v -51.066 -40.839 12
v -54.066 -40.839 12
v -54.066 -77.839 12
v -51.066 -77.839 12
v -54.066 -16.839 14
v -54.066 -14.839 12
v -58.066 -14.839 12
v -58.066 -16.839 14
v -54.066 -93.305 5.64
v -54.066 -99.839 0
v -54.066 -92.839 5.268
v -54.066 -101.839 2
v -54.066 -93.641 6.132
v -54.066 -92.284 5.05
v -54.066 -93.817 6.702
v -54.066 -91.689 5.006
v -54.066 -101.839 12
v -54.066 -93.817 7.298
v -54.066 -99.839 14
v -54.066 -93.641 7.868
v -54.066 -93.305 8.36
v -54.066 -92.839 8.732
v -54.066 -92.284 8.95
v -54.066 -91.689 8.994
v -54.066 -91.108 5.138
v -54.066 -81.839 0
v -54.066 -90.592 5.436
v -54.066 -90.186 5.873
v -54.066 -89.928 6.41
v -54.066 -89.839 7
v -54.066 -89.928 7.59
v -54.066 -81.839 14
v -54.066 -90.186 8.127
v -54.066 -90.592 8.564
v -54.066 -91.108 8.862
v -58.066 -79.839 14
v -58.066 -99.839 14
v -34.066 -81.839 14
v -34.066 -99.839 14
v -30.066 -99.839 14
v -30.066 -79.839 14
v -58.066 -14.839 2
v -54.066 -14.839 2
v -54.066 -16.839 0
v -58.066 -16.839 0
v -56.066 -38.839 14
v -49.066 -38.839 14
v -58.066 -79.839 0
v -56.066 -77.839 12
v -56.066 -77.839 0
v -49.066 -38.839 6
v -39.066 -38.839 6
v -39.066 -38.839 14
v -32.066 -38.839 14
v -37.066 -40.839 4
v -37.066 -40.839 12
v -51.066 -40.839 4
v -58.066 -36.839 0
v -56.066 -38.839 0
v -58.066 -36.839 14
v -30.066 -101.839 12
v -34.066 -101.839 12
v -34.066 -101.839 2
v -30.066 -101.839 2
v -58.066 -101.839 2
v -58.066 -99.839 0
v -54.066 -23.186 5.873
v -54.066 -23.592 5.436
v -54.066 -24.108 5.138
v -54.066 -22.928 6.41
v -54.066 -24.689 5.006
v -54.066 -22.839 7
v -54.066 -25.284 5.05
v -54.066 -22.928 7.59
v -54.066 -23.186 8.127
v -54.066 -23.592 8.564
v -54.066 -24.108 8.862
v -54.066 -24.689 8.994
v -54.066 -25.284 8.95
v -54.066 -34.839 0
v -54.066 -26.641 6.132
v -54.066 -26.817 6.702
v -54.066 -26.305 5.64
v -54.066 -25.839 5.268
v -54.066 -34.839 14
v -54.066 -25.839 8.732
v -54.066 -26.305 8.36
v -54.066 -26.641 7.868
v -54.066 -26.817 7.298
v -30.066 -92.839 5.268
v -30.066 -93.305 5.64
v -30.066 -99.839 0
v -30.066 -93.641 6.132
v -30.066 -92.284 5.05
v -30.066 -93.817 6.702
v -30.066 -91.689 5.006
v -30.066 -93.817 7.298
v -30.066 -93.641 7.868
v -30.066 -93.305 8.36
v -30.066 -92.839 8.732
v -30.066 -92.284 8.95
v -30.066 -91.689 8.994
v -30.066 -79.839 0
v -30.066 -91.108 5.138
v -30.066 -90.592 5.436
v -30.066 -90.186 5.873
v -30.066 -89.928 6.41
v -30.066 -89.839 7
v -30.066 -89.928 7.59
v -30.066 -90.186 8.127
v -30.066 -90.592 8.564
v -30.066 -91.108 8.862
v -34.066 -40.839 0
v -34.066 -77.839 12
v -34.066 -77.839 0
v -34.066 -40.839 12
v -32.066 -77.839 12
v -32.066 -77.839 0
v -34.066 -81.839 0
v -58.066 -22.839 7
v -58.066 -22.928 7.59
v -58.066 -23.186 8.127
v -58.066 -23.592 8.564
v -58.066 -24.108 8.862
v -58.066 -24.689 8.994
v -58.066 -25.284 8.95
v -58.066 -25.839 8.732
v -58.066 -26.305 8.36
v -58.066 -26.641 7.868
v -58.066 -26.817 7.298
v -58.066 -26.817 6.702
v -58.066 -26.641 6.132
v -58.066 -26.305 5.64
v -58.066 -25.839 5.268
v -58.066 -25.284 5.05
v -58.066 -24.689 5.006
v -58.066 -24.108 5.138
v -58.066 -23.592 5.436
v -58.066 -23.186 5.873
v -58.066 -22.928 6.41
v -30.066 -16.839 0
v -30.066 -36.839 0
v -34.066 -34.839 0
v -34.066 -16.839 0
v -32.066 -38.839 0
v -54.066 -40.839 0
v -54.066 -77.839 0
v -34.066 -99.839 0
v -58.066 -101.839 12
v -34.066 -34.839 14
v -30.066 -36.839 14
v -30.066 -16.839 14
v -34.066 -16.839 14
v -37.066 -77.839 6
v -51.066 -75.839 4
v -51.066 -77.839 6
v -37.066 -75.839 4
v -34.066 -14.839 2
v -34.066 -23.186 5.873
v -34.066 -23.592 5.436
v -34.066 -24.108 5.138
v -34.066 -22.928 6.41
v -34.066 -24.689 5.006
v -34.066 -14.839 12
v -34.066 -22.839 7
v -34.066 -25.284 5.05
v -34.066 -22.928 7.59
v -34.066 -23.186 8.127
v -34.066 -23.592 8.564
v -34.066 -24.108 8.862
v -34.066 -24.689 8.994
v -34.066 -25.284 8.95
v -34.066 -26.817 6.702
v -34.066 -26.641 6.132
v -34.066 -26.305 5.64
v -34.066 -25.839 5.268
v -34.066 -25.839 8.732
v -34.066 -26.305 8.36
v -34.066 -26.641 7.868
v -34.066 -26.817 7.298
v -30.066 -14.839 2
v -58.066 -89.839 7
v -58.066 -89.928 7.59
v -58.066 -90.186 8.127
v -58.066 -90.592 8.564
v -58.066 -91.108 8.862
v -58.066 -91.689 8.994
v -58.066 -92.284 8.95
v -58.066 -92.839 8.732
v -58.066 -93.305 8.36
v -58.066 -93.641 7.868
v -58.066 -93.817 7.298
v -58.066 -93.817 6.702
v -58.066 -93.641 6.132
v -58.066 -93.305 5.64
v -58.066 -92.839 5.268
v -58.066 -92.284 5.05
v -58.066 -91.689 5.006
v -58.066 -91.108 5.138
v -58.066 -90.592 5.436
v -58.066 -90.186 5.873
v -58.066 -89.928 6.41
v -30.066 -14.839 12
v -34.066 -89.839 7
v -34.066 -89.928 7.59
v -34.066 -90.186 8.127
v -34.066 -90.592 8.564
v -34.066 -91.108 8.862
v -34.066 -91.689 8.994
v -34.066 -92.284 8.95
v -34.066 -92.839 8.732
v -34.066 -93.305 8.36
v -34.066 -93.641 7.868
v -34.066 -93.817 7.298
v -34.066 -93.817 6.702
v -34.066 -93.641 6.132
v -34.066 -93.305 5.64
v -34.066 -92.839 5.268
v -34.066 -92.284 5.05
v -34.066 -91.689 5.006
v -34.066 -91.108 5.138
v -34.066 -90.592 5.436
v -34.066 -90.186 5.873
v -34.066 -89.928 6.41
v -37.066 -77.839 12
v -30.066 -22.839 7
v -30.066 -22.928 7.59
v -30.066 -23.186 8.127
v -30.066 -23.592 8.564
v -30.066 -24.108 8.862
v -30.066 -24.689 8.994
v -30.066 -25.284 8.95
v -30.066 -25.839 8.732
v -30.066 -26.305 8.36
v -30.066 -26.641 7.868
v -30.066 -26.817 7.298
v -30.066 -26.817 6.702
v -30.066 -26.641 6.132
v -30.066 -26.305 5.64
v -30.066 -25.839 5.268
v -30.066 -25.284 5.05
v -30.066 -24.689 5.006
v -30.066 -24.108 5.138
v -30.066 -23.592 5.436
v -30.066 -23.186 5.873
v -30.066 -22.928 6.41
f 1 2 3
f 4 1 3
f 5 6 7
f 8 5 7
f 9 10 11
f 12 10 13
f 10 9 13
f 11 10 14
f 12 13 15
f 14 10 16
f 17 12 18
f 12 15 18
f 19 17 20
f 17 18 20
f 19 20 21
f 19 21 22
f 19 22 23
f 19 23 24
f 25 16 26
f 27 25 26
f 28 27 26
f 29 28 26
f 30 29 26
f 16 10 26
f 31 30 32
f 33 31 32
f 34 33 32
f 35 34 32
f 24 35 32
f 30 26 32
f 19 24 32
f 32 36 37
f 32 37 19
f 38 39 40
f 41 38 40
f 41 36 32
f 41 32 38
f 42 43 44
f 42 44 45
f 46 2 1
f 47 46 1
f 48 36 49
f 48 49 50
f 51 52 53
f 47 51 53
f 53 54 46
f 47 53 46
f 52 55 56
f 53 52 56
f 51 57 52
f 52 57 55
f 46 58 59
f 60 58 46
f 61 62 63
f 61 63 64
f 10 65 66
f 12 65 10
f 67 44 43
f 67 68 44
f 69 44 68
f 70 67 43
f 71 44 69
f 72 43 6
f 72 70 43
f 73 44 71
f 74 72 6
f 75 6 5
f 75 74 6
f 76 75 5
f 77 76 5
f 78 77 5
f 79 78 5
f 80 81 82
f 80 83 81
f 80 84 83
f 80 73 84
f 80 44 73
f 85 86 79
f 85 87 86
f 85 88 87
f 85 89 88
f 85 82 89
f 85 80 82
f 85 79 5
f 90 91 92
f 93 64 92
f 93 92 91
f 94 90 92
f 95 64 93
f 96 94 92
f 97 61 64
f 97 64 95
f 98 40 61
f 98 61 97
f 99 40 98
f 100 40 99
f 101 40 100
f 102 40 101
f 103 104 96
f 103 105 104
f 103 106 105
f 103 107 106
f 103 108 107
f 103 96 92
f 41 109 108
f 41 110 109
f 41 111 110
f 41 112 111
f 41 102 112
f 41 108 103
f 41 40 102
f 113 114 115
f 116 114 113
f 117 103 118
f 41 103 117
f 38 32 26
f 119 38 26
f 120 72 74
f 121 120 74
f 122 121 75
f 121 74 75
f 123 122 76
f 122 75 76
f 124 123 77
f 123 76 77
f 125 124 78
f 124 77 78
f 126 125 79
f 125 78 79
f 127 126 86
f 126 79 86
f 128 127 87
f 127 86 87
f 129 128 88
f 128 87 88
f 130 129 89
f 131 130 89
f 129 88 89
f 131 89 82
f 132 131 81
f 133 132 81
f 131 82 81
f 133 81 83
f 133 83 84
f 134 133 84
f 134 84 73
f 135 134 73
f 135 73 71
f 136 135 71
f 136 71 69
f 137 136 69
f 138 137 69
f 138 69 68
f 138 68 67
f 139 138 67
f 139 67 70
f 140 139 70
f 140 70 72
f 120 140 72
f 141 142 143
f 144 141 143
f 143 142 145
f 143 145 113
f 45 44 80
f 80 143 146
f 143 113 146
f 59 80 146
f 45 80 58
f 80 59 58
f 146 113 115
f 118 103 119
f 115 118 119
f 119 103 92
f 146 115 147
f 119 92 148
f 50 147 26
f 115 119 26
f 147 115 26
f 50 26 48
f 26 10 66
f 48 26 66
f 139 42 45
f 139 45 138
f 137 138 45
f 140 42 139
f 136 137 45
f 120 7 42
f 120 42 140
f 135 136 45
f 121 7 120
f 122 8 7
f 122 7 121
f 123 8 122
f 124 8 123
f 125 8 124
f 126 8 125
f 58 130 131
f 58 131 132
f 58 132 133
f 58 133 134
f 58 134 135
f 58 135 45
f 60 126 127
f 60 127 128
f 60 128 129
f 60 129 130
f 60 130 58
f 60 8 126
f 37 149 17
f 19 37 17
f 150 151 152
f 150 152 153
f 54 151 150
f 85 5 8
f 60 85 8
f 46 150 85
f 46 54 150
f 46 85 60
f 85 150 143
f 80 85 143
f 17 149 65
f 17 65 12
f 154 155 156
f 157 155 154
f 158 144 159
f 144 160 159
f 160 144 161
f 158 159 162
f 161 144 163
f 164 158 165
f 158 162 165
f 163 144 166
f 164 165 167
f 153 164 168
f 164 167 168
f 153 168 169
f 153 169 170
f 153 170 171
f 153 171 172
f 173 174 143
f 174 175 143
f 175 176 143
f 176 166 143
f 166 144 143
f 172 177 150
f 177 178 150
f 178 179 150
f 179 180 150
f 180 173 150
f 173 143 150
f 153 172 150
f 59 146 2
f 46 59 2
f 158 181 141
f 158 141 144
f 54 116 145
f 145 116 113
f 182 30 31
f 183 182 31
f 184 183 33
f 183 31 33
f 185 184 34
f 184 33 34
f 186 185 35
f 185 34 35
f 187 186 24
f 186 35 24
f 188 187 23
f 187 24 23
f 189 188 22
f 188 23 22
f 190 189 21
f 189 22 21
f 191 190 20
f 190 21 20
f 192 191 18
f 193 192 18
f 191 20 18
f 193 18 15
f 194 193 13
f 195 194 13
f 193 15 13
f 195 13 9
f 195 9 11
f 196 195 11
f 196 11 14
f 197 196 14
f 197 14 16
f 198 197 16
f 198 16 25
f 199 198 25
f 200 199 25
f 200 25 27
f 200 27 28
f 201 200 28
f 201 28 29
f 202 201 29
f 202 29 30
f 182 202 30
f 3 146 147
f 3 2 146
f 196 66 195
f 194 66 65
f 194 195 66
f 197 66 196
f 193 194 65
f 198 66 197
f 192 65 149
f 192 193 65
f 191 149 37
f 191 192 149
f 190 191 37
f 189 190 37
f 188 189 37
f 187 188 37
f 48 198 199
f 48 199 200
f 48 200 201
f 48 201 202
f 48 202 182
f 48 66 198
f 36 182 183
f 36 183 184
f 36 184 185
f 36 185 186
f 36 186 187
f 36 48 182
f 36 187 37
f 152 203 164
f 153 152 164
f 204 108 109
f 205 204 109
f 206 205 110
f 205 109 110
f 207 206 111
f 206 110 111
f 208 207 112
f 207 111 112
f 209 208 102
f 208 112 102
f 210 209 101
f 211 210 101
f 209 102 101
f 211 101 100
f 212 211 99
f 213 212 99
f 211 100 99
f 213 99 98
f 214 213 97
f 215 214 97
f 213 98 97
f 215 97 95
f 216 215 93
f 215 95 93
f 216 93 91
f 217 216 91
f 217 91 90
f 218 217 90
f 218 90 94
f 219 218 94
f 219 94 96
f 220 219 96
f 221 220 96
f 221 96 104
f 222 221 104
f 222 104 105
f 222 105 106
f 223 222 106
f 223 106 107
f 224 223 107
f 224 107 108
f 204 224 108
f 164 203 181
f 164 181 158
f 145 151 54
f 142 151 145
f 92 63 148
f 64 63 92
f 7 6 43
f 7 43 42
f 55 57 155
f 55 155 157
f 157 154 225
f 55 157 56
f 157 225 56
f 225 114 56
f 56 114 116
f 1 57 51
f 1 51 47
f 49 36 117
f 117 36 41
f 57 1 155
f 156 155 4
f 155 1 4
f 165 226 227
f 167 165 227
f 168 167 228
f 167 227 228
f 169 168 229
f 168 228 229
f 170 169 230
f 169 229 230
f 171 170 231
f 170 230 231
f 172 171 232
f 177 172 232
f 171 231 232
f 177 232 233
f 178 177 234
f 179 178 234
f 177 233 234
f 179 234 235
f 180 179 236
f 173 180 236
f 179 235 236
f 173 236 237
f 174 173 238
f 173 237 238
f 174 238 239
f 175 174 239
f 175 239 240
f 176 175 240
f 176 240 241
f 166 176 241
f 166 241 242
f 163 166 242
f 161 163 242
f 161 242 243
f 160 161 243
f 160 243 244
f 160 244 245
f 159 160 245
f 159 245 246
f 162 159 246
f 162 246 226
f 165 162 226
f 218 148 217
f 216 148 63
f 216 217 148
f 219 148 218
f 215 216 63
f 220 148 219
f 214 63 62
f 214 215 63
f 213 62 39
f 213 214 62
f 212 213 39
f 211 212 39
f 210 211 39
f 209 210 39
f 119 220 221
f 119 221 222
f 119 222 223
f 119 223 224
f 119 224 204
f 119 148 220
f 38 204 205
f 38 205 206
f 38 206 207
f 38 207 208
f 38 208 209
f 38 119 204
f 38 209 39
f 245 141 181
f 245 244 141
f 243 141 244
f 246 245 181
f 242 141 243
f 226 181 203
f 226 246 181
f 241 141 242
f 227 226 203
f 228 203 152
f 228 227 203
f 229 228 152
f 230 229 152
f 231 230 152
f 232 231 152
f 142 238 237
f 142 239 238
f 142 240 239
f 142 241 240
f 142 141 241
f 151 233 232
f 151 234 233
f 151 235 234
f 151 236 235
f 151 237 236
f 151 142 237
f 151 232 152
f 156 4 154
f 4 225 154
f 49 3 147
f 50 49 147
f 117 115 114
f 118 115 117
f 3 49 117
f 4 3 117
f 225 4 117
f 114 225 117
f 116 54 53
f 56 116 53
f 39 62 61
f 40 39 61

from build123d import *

# Parameters (mm, degrees)
F0_W            = 20
F0_H            = 22
F0_H_2          = 4
F0_H_3          = 20.4
F1_DEPTH        = 2
F2_DEPTH        = 10
F3_R            = 2.2
F4_DEPTH        = 30
F5_W            = 20
F5_H            = 12
F5_R            = 2.6
F7_DEPTH        = 4
F6_W            = 20
F6_H            = 12
F6_R            = 2.6
F8_DEPTH        = 4
F9_T1_DEPTH     = 25
F9_T3_DEPTH     = 57.4
F9_T5_DEPTH     = 16
F9_T7_DEPTH     = 48.4
F9_T9_DEPTH     = 2
F9_T11_DEPTH    = 20
F9_T13_DEPTH    = 7
F9_T15_DEPTH    = 25
F9_T17_DEPTH    = 14
F9_T19_DEPTH    = 27
F9_T21_DEPTH    = 14
F9_T23_DEPTH    = 30
F9_T25_DEPTH    = 7
F9_T27_DEPTH    = 8
F9_S31_W        = 2
F9_S31_H        = 2
F9_T32_DEPTH    = 2
F9_S37_W        = 2
F9_S37_H        = 2
F9_T38_DEPTH    = 2
F9_S43_W        = 2
F9_S43_H        = 2
F9_T44_DEPTH    = 2
F9_S49_W        = 2
F9_S49_H        = 2
F9_T50_DEPTH    = 2
F9_S55_W        = 2
F9_S55_H        = 2
F9_T56_DEPTH    = 2
F9_S61_W        = 2
F9_S61_H        = 2
F9_T62_DEPTH    = 2
F9_S67_W        = 2
F9_S67_H        = 2
F9_T68_DEPTH    = 2
F9_S73_W        = 2
F9_S73_H        = 2
F9_T74_DEPTH    = 2
F9_T81_DEPTH    = 30
F9_T85_DEPTH    = 30
F9_T92_DEPTH    = 7
F9_T96_DEPTH    = 53.4
F9_T103_DEPTH   = 30
F9_T107_DEPTH   = 30
F9_S1_T1_DEPTH  = 7
F9_S1_T3_DEPTH  = 30
F9_S1_T5_DEPTH  = 16
F9_S1_T7_DEPTH  = 8
F9_S1_S11_W     = 2
F9_S1_S11_H     = 2
F9_S1_T12_DEPTH = 2
F9_S1_S17_W     = 2
F9_S1_S17_H     = 2
F9_S1_T18_DEPTH = 2
F9_S1_S23_W     = 2
F9_S1_S23_H     = 2
F9_S1_T24_DEPTH = 2
F9_S1_S29_W     = 2
F9_S1_S29_H     = 2
F9_S1_T30_DEPTH = 2
F10_W           = 20
F10_H           = 47
F11_DEPTH       = 4
F12_W           = 20
F12_H           = 4
F13_DEPTH       = 10
F16_DEPTH       = 4
F17_DEPTH       = 4
F19_W           = 4
F19_H           = 14
F20_DEPTH       = 20
F18_W           = 4
F18_H           = 14
F21_DEPTH       = 20
F22_W           = 39
F22_H           = 8
F23_DEPTH       = 3
F24_W           = 39
F24_H           = 8
F25_DEPTH       = 3
F26_R           = 2
F27_R           = 2
F28_DEPTH       = 28.3421242009
F29_SIZE        = 1.99999


# Not quite as in the source:
# - a fillet or chamfer that OpenCascade refuses, or shapes differently, is made with other operations: its cross-section is extruded or revolved along the edge and cut away or added
# - a fillet or chamfer is up to 0.001 mm smaller than in the source, because OpenCascade refuses the exact size
# - a feature names something its author has since deleted; it is built from what else it names


with BuildPart() as f1:
    # F0 (on Top) → F1 (new body)
    with BuildSketch(Plane.XY):
        with Locations((-44.4073281825, 48.6883277684)):
            Rectangle(F0_W, F0_H)
        with Locations((-44.4073281825, 61.6883277684)):
            Rectangle(F0_W, F0_H_2)
        with Locations((-44.4073281825, 35.6883277684)):
            Rectangle(F0_W, F0_H_2)
        with Locations((-44.4073281825, 23.4883277684)):
            Rectangle(F0_W, F0_H_3)
        with Locations((-44.4073281825, 11.2883277684)):
            Rectangle(F0_W, F0_H_2)
    extrude(amount=-F1_DEPTH)

    # F0 (on Top) → F2 (join)
    with BuildSketch(Plane.XY):
        with Locations((-44.4073281825, 35.6883277684)):
            Rectangle(F0_W, F0_H_2)
        with Locations((-44.4073281825, 61.6883277684)):
            Rectangle(F0_W, F0_H_2)
        with Locations((-44.4073281825, 11.2883277684)):
            Rectangle(F0_W, F0_H_2)
    extrude(amount=F2_DEPTH)

    # F3 (on face) → F4 (cut)
    with BuildSketch(Plane.XZ.offset(-9.2883277684)):
        with Locations((-44.4073281825, 5.5)):
            Circle(F3_R)
    extrude(amount=-F4_DEPTH, mode=Mode.SUBTRACT)

    # F5 (on face) → F7 (join)
    with BuildSketch(Plane(origin=(-54.4073281825, 0, 0), x_dir=(0, -1, 0), z_dir=(-1, 0, 0))):
        with Locations((-73.6883277684, 4)):
            Rectangle(F5_W, F5_H)
        with Locations((-73.6883277684, 4)):
            Circle(F5_R, mode=Mode.SUBTRACT)
    extrude(amount=F7_DEPTH)

    # F6 (on face) → F8 (join)
    with BuildSketch(Plane.YZ.offset(-34.4073281825)):
        with Locations((73.6883277684, 4)):
            Rectangle(F6_W, F6_H)
        with Locations((73.6883277684, 4)):
            Circle(F6_R, mode=Mode.SUBTRACT)
        Polygon((63.6883277684, 10), (59.6883277684, 10), (59.6883277684, 0), (59.6883277684, -2), (63.6883277684, -2), align=None)
    extrude(amount=F8_DEPTH)

    # F9: fillet of radius 2 on 26 edges, made by hand

    # F9_s2 → F9_t1 (cut)
    with BuildSketch(Plane.YZ.offset(-59.4073281825)):
        with BuildLine():
            ThreePointArc((63.6883277684, 0), (63.1025413308, -1.4142135624), (61.6883277684, -2))
            Line((61.6883277684, -2), (63.6883277684, -2))
            Line((63.6883277684, -2), (63.6883277684, 0))
        make_face()
        with BuildLine():
            ThreePointArc((63.6883277684, 8), (63.1025413308, 9.4142135624), (61.6883277684, 10))
            Line((61.6883277684, 10), (63.6883277684, 10))
            Line((63.6883277684, 10), (63.6883277684, 8))
        make_face()
    extrude(amount=F9_T1_DEPTH, mode=Mode.SUBTRACT)

    # F9_s4 → F9_t3 (cut)
    with BuildSketch(Plane.XZ.offset(-68.6883277684)):
        with BuildLine():
            ThreePointArc((-54.4073281825, 0), (-53.8215417448, -1.4142135624), (-52.4073281825, -2))
            Line((-52.4073281825, -2), (-54.4073281825, -2))
            Line((-54.4073281825, -2), (-54.4073281825, 0))
        make_face()
    extrude(amount=F9_T3_DEPTH, mode=Mode.SUBTRACT)

    # F9_s6 → F9_t5 (cut)
    with BuildSketch(Plane.YZ.offset(-52.4073281825)):
        with BuildLine():
            ThreePointArc((9.2883277684, 0), (9.8741142061, -1.4142135624), (11.2883277684, -2))
            Line((11.2883277684, -2), (9.2883277684, -2))
            Line((9.2883277684, -2), (9.2883277684, 0))
        make_face()
        with BuildLine():
            ThreePointArc((9.2883277684, 8), (9.8741142061, 9.4142135624), (11.2883277684, 10))
            Line((11.2883277684, 10), (9.2883277684, 10))
            Line((9.2883277684, 10), (9.2883277684, 8))
        make_face()
    extrude(amount=F9_T5_DEPTH, mode=Mode.SUBTRACT)

    # F9_s8 → F9_t7 (cut)
    with BuildSketch(Plane.XZ.offset(-59.6883277684)):
        with BuildLine():
            ThreePointArc((-34.4073281825, 0), (-34.9931146201, -1.4142135624), (-36.4073281825, -2))
            Line((-36.4073281825, -2), (-34.4073281825, -2))
            Line((-34.4073281825, -2), (-34.4073281825, 0))
        make_face()
    extrude(amount=F9_T7_DEPTH, mode=Mode.SUBTRACT)

    # F9_s10 → F9_t9 (cut)
    with BuildSketch(Plane.YZ.offset(-34.4073281825)):
        with BuildLine():
            ThreePointArc((59.6883277684, 0), (60.2741142061, -1.4142135624), (61.6883277684, -2))
            Line((61.6883277684, -2), (59.6883277684, -2))
            Line((59.6883277684, -2), (59.6883277684, 0))
        make_face()
    extrude(amount=F9_T9_DEPTH, mode=Mode.SUBTRACT)

    # F9_s12 → F9_t11 (cut)
    with BuildSketch(Plane.XZ.offset(-81.6883277684)):
        with BuildLine():
            ThreePointArc((-30.4073281825, 0), (-30.9931146201, -1.4142135624), (-32.4073281825, -2))
            Line((-32.4073281825, -2), (-30.4073281825, -2))
            Line((-30.4073281825, -2), (-30.4073281825, 0))
        make_face()
        with BuildLine():
            ThreePointArc((-30.4073281825, 8), (-30.9931146201, 9.4142135624), (-32.4073281825, 10))
            Line((-32.4073281825, 10), (-30.4073281825, 10))
            Line((-30.4073281825, 10), (-30.4073281825, 8))
        make_face()
    extrude(amount=F9_T11_DEPTH, mode=Mode.SUBTRACT)

    # F9_s14 → F9_t13 (cut)
    with BuildSketch(Plane.YZ.offset(-39.4073281825)):
        with BuildLine():
            ThreePointArc((83.6883277684, 0), (83.1025413308, -1.4142135624), (81.6883277684, -2))
            Line((81.6883277684, -2), (83.6883277684, -2))
            Line((83.6883277684, -2), (83.6883277684, 0))
        make_face()
        with BuildLine():
            ThreePointArc((83.6883277684, 8), (83.1025413308, 9.4142135624), (81.6883277684, 10))
            Line((81.6883277684, 10), (83.6883277684, 10))
            Line((83.6883277684, 10), (83.6883277684, 8))
        make_face()
    extrude(amount=F9_T13_DEPTH, mode=Mode.SUBTRACT)

    # F9_s16 → F9_t15 (cut)
    with BuildSketch(Plane.XZ.offset(-88.6883277684)):
        with BuildLine():
            ThreePointArc((-34.4073281825, 0), (-33.8215417448, -1.4142135624), (-32.4073281825, -2))
            Line((-32.4073281825, -2), (-34.4073281825, -2))
            Line((-34.4073281825, -2), (-34.4073281825, 0))
        make_face()
        with BuildLine():
            ThreePointArc((-34.4073281825, 8), (-33.8215417448, 9.4142135624), (-32.4073281825, 10))
            Line((-32.4073281825, 10), (-34.4073281825, 10))
            Line((-34.4073281825, 10), (-34.4073281825, 8))
        make_face()
    extrude(amount=F9_T15_DEPTH, mode=Mode.SUBTRACT)

    # F9_s18 → F9_t17 (cut)
    with BuildSketch(Plane.XZ.offset(-68.6883277684)):
        with BuildLine():
            ThreePointArc((-52.4073281825, 10), (-53.8215417448, 9.4142135624), (-54.4073281825, 8))
            Line((-54.4073281825, 8), (-54.4073281825, 10))
            Line((-54.4073281825, 10), (-52.4073281825, 10))
        make_face()
    extrude(amount=F9_T17_DEPTH, mode=Mode.SUBTRACT)

    # F9_s20 → F9_t19 (cut)
    with BuildSketch(Plane.YZ.offset(-59.4073281825)):
        with BuildLine():
            ThreePointArc((59.6883277684, 8), (60.2741142061, 9.4142135624), (61.6883277684, 10))
            Line((61.6883277684, 10), (59.6883277684, 10))
            Line((59.6883277684, 10), (59.6883277684, 8))
        make_face()
    extrude(amount=F9_T19_DEPTH, mode=Mode.SUBTRACT)

    # F9_s22 → F9_t21 (cut)
    with BuildSketch(Plane.XZ.offset(-42.6883277684)):
        with BuildLine():
            ThreePointArc((-52.4073281825, 10), (-53.8215417448, 9.4142135624), (-54.4073281825, 8))
            Line((-54.4073281825, 8), (-54.4073281825, 10))
            Line((-54.4073281825, 10), (-52.4073281825, 10))
        make_face()
        with BuildLine():
            ThreePointArc((-36.4073281825, 10), (-34.9931146201, 9.4142135624), (-34.4073281825, 8))
            Line((-34.4073281825, 8), (-34.4073281825, 10))
            Line((-34.4073281825, 10), (-36.4073281825, 10))
        make_face()
    extrude(amount=F9_T21_DEPTH, mode=Mode.SUBTRACT)

    # F9_s24 → F9_t23 (cut)
    with BuildSketch(Plane.YZ.offset(-59.4073281825)):
        with BuildLine():
            ThreePointArc((33.6883277684, 8), (34.2741142061, 9.4142135624), (35.6883277684, 10))
            Line((35.6883277684, 10), (33.6883277684, 10))
            Line((33.6883277684, 10), (33.6883277684, 8))
        make_face()
        with BuildLine():
            ThreePointArc((37.6883277684, 8), (37.1025413308, 9.4142135624), (35.6883277684, 10))
            Line((35.6883277684, 10), (37.6883277684, 10))
            Line((37.6883277684, 10), (37.6883277684, 8))
        make_face()
        with BuildLine():
            ThreePointArc((13.2883277684, 8), (12.7025413308, 9.4142135624), (11.2883277684, 10))
            Line((11.2883277684, 10), (13.2883277684, 10))
            Line((13.2883277684, 10), (13.2883277684, 8))
        make_face()
    extrude(amount=F9_T23_DEPTH, mode=Mode.SUBTRACT)

    # F9_s26 → F9_t25 (cut)
    with BuildSketch(Plane.XZ.offset(-18.2883277684)):
        with BuildLine():
            ThreePointArc((-36.4073281825, 10), (-34.9931146201, 9.4142135624), (-34.4073281825, 8))
            Line((-34.4073281825, 8), (-34.4073281825, 10))
            Line((-34.4073281825, 10), (-36.4073281825, 10))
        make_face()
        with BuildLine():
            ThreePointArc((-52.4073281825, 10), (-53.8215417448, 9.4142135624), (-54.4073281825, 8))
            Line((-54.4073281825, 8), (-54.4073281825, 10))
            Line((-54.4073281825, 10), (-52.4073281825, 10))
        make_face()
    extrude(amount=F9_T25_DEPTH, mode=Mode.SUBTRACT)

    # F9_s28 → F9_t27 (cut)
    with BuildSketch(Plane.XY):
        with BuildLine():
            ThreePointArc((-36.4073281825, 9.2883277684), (-34.9931146201, 9.8741142061), (-34.4073281825, 11.2883277684))
            Line((-34.4073281825, 11.2883277684), (-34.4073281825, 9.2883277684))
            Line((-34.4073281825, 9.2883277684), (-36.4073281825, 9.2883277684))
        make_face()
        with BuildLine():
            ThreePointArc((-52.4073281825, 9.2883277684), (-53.8215417448, 9.8741142061), (-54.4073281825, 11.2883277684))
            Line((-54.4073281825, 11.2883277684), (-54.4073281825, 9.2883277684))
            Line((-54.4073281825, 9.2883277684), (-52.4073281825, 9.2883277684))
        make_face()
        with BuildLine():
            ThreePointArc((-30.4073281825, 61.6883277684), (-30.9931146201, 60.2741142061), (-32.4073281825, 59.6883277684))
            Line((-32.4073281825, 59.6883277684), (-30.4073281825, 59.6883277684))
            Line((-30.4073281825, 59.6883277684), (-30.4073281825, 61.6883277684))
        make_face()
        with BuildLine():
            ThreePointArc((-30.4073281825, 81.6883277684), (-30.9931146201, 83.1025413308), (-32.4073281825, 83.6883277684))
            Line((-32.4073281825, 83.6883277684), (-30.4073281825, 83.6883277684))
            Line((-30.4073281825, 83.6883277684), (-30.4073281825, 81.6883277684))
        make_face()
    extrude(amount=F9_T27_DEPTH, mode=Mode.SUBTRACT)


with BuildPart() as f9_tool30:
    # F9_s31 → F9_t32 (new body)
    with BuildSketch(Plane.YZ.offset(-52.4073281825)):
        with Locations((10.2883277684, -1)):
            Rectangle(F9_S31_W, F9_S31_H)
    extrude(amount=-F9_T32_DEPTH)

    # F9_s33 → F9_t34 (revolve, cut)
    with BuildSketch(Plane(origin=(-52.4073281825, 11.2883277684, 0), x_dir=(0, 0.7071067812, 0.7071067812), z_dir=(0, -0.7071067812, 0.7071067812))):
        with BuildLine():
            ThreePointArc((0, -2), (2, 0), (0, 2))
            Line((0, 2), (0, -2))
        make_face()
    revolve(axis=Axis((-52.4073281825, 11.2883277684, 0), (-1, 0, 0)), mode=Mode.SUBTRACT)


with BuildPart() as f1_1:
    add(f1.part)

    # F9_t29: cut F9_tool30
    add(f9_tool30.part, mode=Mode.SUBTRACT)


with BuildPart() as f9_tool36:
    # F9_s37 → F9_t38 (new body)
    with BuildSketch(Plane.XY):
        with Locations((-35.4073281825, 10.2883277684)):
            Rectangle(F9_S37_W, F9_S37_H)
    extrude(amount=-F9_T38_DEPTH)

    # F9_s39 → F9_t40 (revolve, cut)
    with BuildSketch(Plane(origin=(-36.4073281825, 11.2883277684, 0), x_dir=(-0.7071067812, 0.7071067812, 0), z_dir=(-0.7071067812, -0.7071067812, 0))):
        with BuildLine():
            ThreePointArc((0, -2), (2, 0), (0, 2))
            Line((0, 2), (0, -2))
        make_face()
    revolve(axis=Axis((-36.4073281825, 11.2883277684, 0), (0, 0, -1)), mode=Mode.SUBTRACT)


with BuildPart() as f1_2:
    add(f1_1.part)

    # F9_t35: cut F9_tool36
    add(f9_tool36.part, mode=Mode.SUBTRACT)


with BuildPart() as f9_tool42:
    # F9_s43 → F9_t44 (new body)
    with BuildSketch(Plane.YZ.offset(-32.4073281825)):
        with Locations((60.6883277684, -1)):
            Rectangle(F9_S43_W, F9_S43_H)
    extrude(amount=F9_T44_DEPTH)

    # F9_s45 → F9_t46 (revolve, cut)
    with BuildSketch(Plane(origin=(-32.4073281825, 61.6883277684, 0), x_dir=(0, 0.7071067812, 0.7071067812), z_dir=(0, 0.7071067812, -0.7071067812))):
        with BuildLine():
            ThreePointArc((0, -2), (2, 0), (0, 2))
            Line((0, 2), (0, -2))
        make_face()
    revolve(axis=Axis((-32.4073281825, 61.6883277684, 0), (1, 0, 0)), mode=Mode.SUBTRACT)


with BuildPart() as f1_3:
    add(f1_2.part)

    # F9_t41: cut F9_tool42
    add(f9_tool42.part, mode=Mode.SUBTRACT)


with BuildPart() as f9_tool48:
    # F9_s49 → F9_t50 (new body)
    with BuildSketch(Plane.XY):
        with Locations((-31.4073281825, 82.6883277684)):
            Rectangle(F9_S49_W, F9_S49_H)
    extrude(amount=-F9_T50_DEPTH)

    # F9_s51 → F9_t52 (revolve, cut)
    with BuildSketch(Plane(origin=(-32.4073281825, 81.6883277684, 0), x_dir=(-0.7071067812, -0.7071067812, 0), z_dir=(0.7071067812, -0.7071067812, 0))):
        with BuildLine():
            ThreePointArc((0, -2), (2, 0), (0, 2))
            Line((0, 2), (0, -2))
        make_face()
    revolve(axis=Axis((-32.4073281825, 81.6883277684, 0), (0, 0, -1)), mode=Mode.SUBTRACT)


with BuildPart() as f1_4:
    add(f1_3.part)

    # F9_t47: cut F9_tool48
    add(f9_tool48.part, mode=Mode.SUBTRACT)


with BuildPart() as f9_tool54:
    # F9_s55 → F9_t56 (new body)
    with BuildSketch(Plane.XY.offset(8)):
        with Locations((-31.4073281825, 60.6883277684)):
            Rectangle(F9_S55_W, F9_S55_H)
    extrude(amount=F9_T56_DEPTH)

    # F9_s57 → F9_t58 (revolve, cut)
    with BuildSketch(Plane(origin=(-32.4073281825, 61.6883277684, 8), x_dir=(-0.7071067812, 0.7071067812, 0), z_dir=(0.7071067812, 0.7071067812, 0))):
        with BuildLine():
            ThreePointArc((0, -2), (2, 0), (0, 2))
            Line((0, 2), (0, -2))
        make_face()
    revolve(axis=Axis((-32.4073281825, 61.6883277684, 8), (0, 0, 1)), mode=Mode.SUBTRACT)


with BuildPart() as f1_5:
    add(f1_4.part)

    # F9_t53: cut F9_tool54
    add(f9_tool54.part, mode=Mode.SUBTRACT)


with BuildPart() as f9_tool60:
    # F9_s61 → F9_t62 (new body)
    with BuildSketch(Plane.XZ.offset(-81.6883277684)):
        with Locations((-31.4073281825, 9)):
            Rectangle(F9_S61_W, F9_S61_H)
    extrude(amount=-F9_T62_DEPTH)

    # F9_s63 → F9_t64 (revolve, cut)
    with BuildSketch(Plane(origin=(-32.4073281825, 81.6883277684, 8), x_dir=(-0.7071067812, 0, -0.7071067812), z_dir=(0.7071067812, 0, -0.7071067812))):
        with BuildLine():
            ThreePointArc((0, -2), (2, 0), (0, 2))
            Line((0, 2), (0, -2))
        make_face()
    revolve(axis=Axis((-32.4073281825, 81.6883277684, 8), (0, 1, 0)), mode=Mode.SUBTRACT)


with BuildPart() as f1_6:
    add(f1_5.part)

    # F9_t59: cut F9_tool60
    add(f9_tool60.part, mode=Mode.SUBTRACT)


with BuildPart() as f9_tool66:
    # F9_s67 → F9_t68 (new body)
    with BuildSketch(Plane.XZ.offset(-11.2883277684)):
        with Locations((-35.4073281825, 9)):
            Rectangle(F9_S67_W, F9_S67_H)
    extrude(amount=F9_T68_DEPTH)

    # F9_s69 → F9_t70 (revolve, cut)
    with BuildSketch(Plane(origin=(-36.4073281825, 11.2883277684, 8), x_dir=(-0.7071067812, 0, -0.7071067812), z_dir=(-0.7071067812, 0, 0.7071067812))):
        with BuildLine():
            ThreePointArc((0, -2), (2, 0), (0, 2))
            Line((0, 2), (0, -2))
        make_face()
    revolve(axis=Axis((-36.4073281825, 11.2883277684, 8), (0, -1, 0)), mode=Mode.SUBTRACT)


with BuildPart() as f1_7:
    add(f1_6.part)

    # F9_t65: cut F9_tool66
    add(f9_tool66.part, mode=Mode.SUBTRACT)


with BuildPart() as f9_tool72:
    # F9_s73 → F9_t74 (new body)
    with BuildSketch(Plane.YZ.offset(-52.4073281825)):
        with Locations((10.2883277684, 9)):
            Rectangle(F9_S73_W, F9_S73_H)
    extrude(amount=-F9_T74_DEPTH)

    # F9_s75 → F9_t76 (revolve, cut)
    with BuildSketch(Plane(origin=(-52.4073281825, 11.2883277684, 8), x_dir=(0, 0.7071067812, -0.7071067812), z_dir=(0, 0.7071067812, 0.7071067812))):
        with BuildLine():
            ThreePointArc((0, -2), (2, 0), (0, 2))
            Line((0, 2), (0, -2))
        make_face()
    revolve(axis=Axis((-52.4073281825, 11.2883277684, 8), (-1, 0, 0)), mode=Mode.SUBTRACT)


with BuildPart() as f1_8:
    add(f1_7.part)

    # F9_t71: cut F9_tool72
    add(f9_tool72.part, mode=Mode.SUBTRACT)


with BuildPart() as f9_tool79:
    # F9_s80 → F9_t81 (new body)
    with BuildSketch(Plane.YZ.offset(-29.4073281825)):
        with BuildLine():
            ThreePointArc((63.6883277684, 0), (63.1025413308, -1.4142135624), (61.6883277684, -2))
            Line((61.6883277684, -2), (63.6883277684, -2))
            Line((63.6883277684, -2), (63.6883277684, 0))
        make_face()
    extrude(amount=-F9_T81_DEPTH)

    split(bisect_by=Plane.YZ.offset(-34.4073281825), keep=Keep.TOP)


with BuildPart() as f9_tool83:
    # F9_s84 → F9_t85 (new body)
    with BuildSketch(Plane.XZ.offset(-58.6883277684)):
        with BuildLine():
            ThreePointArc((-34.4073281825, 0), (-33.8215417448, -1.4142135624), (-32.4073281825, -2))
            Line((-32.4073281825, -2), (-34.4073281825, -2))
            Line((-34.4073281825, -2), (-34.4073281825, 0))
        make_face()
    extrude(amount=-F9_T85_DEPTH)

    split(bisect_by=Plane.XZ.offset(-63.6883277684), keep=Keep.TOP)


with BuildPart() as f9_tool79_1:
    add(f9_tool79.part)

    # F9_t87: intersect F9_tool83
    add(f9_tool83.part, mode=Mode.INTERSECT)


with BuildPart() as f1_9:
    add(f1_8.part)

    # F9_t77: cut F9_tool79
    add(f9_tool79_1.part, mode=Mode.SUBTRACT)


with BuildPart() as f9_tool90:
    # F9_s91 → F9_t92 (new body)
    with BuildSketch(Plane.YZ.offset(-39.4073281825)):
        with BuildLine():
            ThreePointArc((59.6883277684, 0), (60.2741142061, -1.4142135624), (61.6883277684, -2))
            Line((61.6883277684, -2), (59.6883277684, -2))
            Line((59.6883277684, -2), (59.6883277684, 0))
        make_face()
    extrude(amount=F9_T92_DEPTH)

    split(bisect_by=Plane.YZ.offset(-34.4073281825), keep=Keep.BOTTOM)


with BuildPart() as f9_tool94:
    # F9_s95 → F9_t96 (new body)
    with BuildSketch(Plane.XZ.offset(-11.2883277684)):
        with BuildLine():
            ThreePointArc((-34.4073281825, 0), (-34.9931146201, -1.4142135624), (-36.4073281825, -2))
            Line((-36.4073281825, -2), (-34.4073281825, -2))
            Line((-34.4073281825, -2), (-34.4073281825, 0))
        make_face()
    extrude(amount=-F9_T96_DEPTH)

    split(bisect_by=Plane.XZ.offset(-59.6883277684), keep=Keep.BOTTOM)


with BuildPart() as f9_tool90_1:
    add(f9_tool90.part)

    # F9_t98: intersect F9_tool94
    add(f9_tool94.part, mode=Mode.INTERSECT)


with BuildPart() as f1_10:
    add(f1_9.part)

    # F9_t88: cut F9_tool90
    add(f9_tool90_1.part, mode=Mode.SUBTRACT)


with BuildPart() as f9_tool101:
    # F9_s102 → F9_t103 (new body)
    with BuildSketch(Plane.YZ.offset(-29.4073281825)):
        with BuildLine():
            ThreePointArc((63.6883277684, 8), (63.1025413308, 9.4142135624), (61.6883277684, 10))
            Line((61.6883277684, 10), (63.6883277684, 10))
            Line((63.6883277684, 10), (63.6883277684, 8))
        make_face()
    extrude(amount=-F9_T103_DEPTH)

    split(bisect_by=Plane.YZ.offset(-34.4073281825), keep=Keep.TOP)


with BuildPart() as f9_tool105:
    # F9_s106 → F9_t107 (new body)
    with BuildSketch(Plane.XZ.offset(-88.6883277684)):
        with BuildLine():
            ThreePointArc((-34.4073281825, 8), (-33.8215417448, 9.4142135624), (-32.4073281825, 10))
            Line((-32.4073281825, 10), (-34.4073281825, 10))
            Line((-34.4073281825, 10), (-34.4073281825, 8))
        make_face()
    extrude(amount=F9_T107_DEPTH)

    split(bisect_by=Plane.XZ.offset(-63.6883277684), keep=Keep.TOP)


with BuildPart() as f9_tool101_1:
    add(f9_tool101.part)

    # F9_t109: intersect F9_tool105
    add(f9_tool105.part, mode=Mode.INTERSECT)


with BuildPart() as f1_11:
    add(f1_10.part)

    # F9_t99: cut F9_tool101
    add(f9_tool101_1.part, mode=Mode.SUBTRACT)

    # F9#s1: fillet of radius 2 on 10 edges, made by hand

    # F9_s1_s2 → F9_s1_t1 (cut)
    with BuildSketch(Plane.YZ.offset(-56.4073281825)):
        with BuildLine():
            ThreePointArc((83.6883277684, 0), (83.1025413308, -1.4142135624), (81.6883277684, -2))
            Line((81.6883277684, -2), (83.6883277684, -2))
            Line((83.6883277684, -2), (83.6883277684, 0))
        make_face()
        with BuildLine():
            ThreePointArc((63.6883277684, 0), (64.2741142061, -1.4142135624), (65.6883277684, -2))
            Line((65.6883277684, -2), (63.6883277684, -2))
            Line((63.6883277684, -2), (63.6883277684, 0))
        make_face()
        with BuildLine():
            ThreePointArc((63.6883277684, 8), (64.2741142061, 9.4142135624), (65.6883277684, 10))
            Line((65.6883277684, 10), (63.6883277684, 10))
            Line((63.6883277684, 10), (63.6883277684, 8))
        make_face()
        with BuildLine():
            ThreePointArc((81.6883277684, 10), (83.1025413308, 9.4142135624), (83.6883277684, 8))
            Line((83.6883277684, 8), (83.6883277684, 10))
            Line((83.6883277684, 10), (81.6883277684, 10))
        make_face()
    extrude(amount=F9_S1_T1_DEPTH, mode=Mode.SUBTRACT)

    # F9_s1_s4 → F9_s1_t3 (cut)
    with BuildSketch(Plane.XZ.offset(-88.6883277684)):
        with BuildLine():
            ThreePointArc((-56.4073281825, -2), (-54.9931146201, -1.4142135624), (-54.4073281825, 0))
            Line((-54.4073281825, 0), (-54.4073281825, -2))
            Line((-54.4073281825, -2), (-56.4073281825, -2))
        make_face()
        with BuildLine():
            ThreePointArc((-56.4073281825, 10), (-54.9931146201, 9.4142135624), (-54.4073281825, 8))
            Line((-54.4073281825, 8), (-54.4073281825, 10))
            Line((-54.4073281825, 10), (-56.4073281825, 10))
        make_face()
    extrude(amount=F9_S1_T3_DEPTH, mode=Mode.SUBTRACT)

    # F9_s1_s6 → F9_s1_t5 (cut)
    with BuildSketch(Plane.XZ.offset(-81.6883277684)):
        with BuildLine():
            ThreePointArc((-58.4073281825, 0), (-57.8215417448, -1.4142135624), (-56.4073281825, -2))
            Line((-56.4073281825, -2), (-58.4073281825, -2))
            Line((-58.4073281825, -2), (-58.4073281825, 0))
        make_face()
        with BuildLine():
            ThreePointArc((-56.4073281825, 10), (-57.8215417448, 9.4142135624), (-58.4073281825, 8))
            Line((-58.4073281825, 8), (-58.4073281825, 10))
            Line((-58.4073281825, 10), (-56.4073281825, 10))
        make_face()
    extrude(amount=F9_S1_T5_DEPTH, mode=Mode.SUBTRACT)

    # F9_s1_s8 → F9_s1_t7 (cut)
    with BuildSketch(Plane.XY):
        with BuildLine():
            ThreePointArc((-56.4073281825, 63.6883277684), (-57.8215417448, 64.2741142061), (-58.4073281825, 65.6883277684))
            Line((-58.4073281825, 65.6883277684), (-58.4073281825, 63.6883277684))
            Line((-58.4073281825, 63.6883277684), (-56.4073281825, 63.6883277684))
        make_face()
        with BuildLine():
            ThreePointArc((-56.4073281825, 83.6883277684), (-57.8215417448, 83.1025413308), (-58.4073281825, 81.6883277684))
            Line((-58.4073281825, 81.6883277684), (-58.4073281825, 83.6883277684))
            Line((-58.4073281825, 83.6883277684), (-56.4073281825, 83.6883277684))
        make_face()
    extrude(amount=F9_S1_T7_DEPTH, mode=Mode.SUBTRACT)


with BuildPart() as f9_s1_tool10:
    # F9_s1_s11 → F9_s1_t12 (new body)
    with BuildSketch(Plane.XZ.offset(-81.6883277684)):
        with Locations((-57.4073281825, -1)):
            Rectangle(F9_S1_S11_W, F9_S1_S11_H)
    extrude(amount=-F9_S1_T12_DEPTH)

    # F9_s1_s13 → F9_s1_t14 (revolve, cut)
    with BuildSketch(Plane(origin=(-56.4073281825, 81.6883277684, 0), x_dir=(0.7071067812, 0, 0.7071067812), z_dir=(-0.7071067812, 0, 0.7071067812))):
        with BuildLine():
            ThreePointArc((0, -2), (2, 0), (0, 2))
            Line((0, 2), (0, -2))
        make_face()
    revolve(axis=Axis((-56.4073281825, 81.6883277684, 0), (0, 1, 0)), mode=Mode.SUBTRACT)


with BuildPart() as f1_12:
    add(f1_11.part)

    # F9_s1_t9: cut F9_s1_tool10
    add(f9_s1_tool10.part, mode=Mode.SUBTRACT)


with BuildPart() as f9_s1_tool16:
    # F9_s1_s17 → F9_s1_t18 (new body)
    with BuildSketch(Plane.XZ.offset(-65.6883277684)):
        with Locations((-57.4073281825, -1)):
            Rectangle(F9_S1_S17_W, F9_S1_S17_H)
    extrude(amount=F9_S1_T18_DEPTH)

    # F9_s1_s19 → F9_s1_t20 (revolve, cut)
    with BuildSketch(Plane(origin=(-56.4073281825, 65.6883277684, 0), x_dir=(0.7071067812, 0, 0.7071067812), z_dir=(0.7071067812, 0, -0.7071067812))):
        with BuildLine():
            ThreePointArc((0, -2), (2, 0), (0, 2))
            Line((0, 2), (0, -2))
        make_face()
    revolve(axis=Axis((-56.4073281825, 65.6883277684, 0), (0, -1, 0)), mode=Mode.SUBTRACT)


with BuildPart() as f1_13:
    add(f1_12.part)

    # F9_s1_t15: cut F9_s1_tool16
    add(f9_s1_tool16.part, mode=Mode.SUBTRACT)


with BuildPart() as f9_s1_tool22:
    # F9_s1_s23 → F9_s1_t24 (new body)
    with BuildSketch(Plane.XZ.offset(-65.6883277684)):
        with Locations((-57.4073281825, 9)):
            Rectangle(F9_S1_S23_W, F9_S1_S23_H)
    extrude(amount=F9_S1_T24_DEPTH)

    # F9_s1_s25 → F9_s1_t26 (revolve, cut)
    with BuildSketch(Plane(origin=(-56.4073281825, 65.6883277684, 8), x_dir=(0.7071067812, 0, -0.7071067812), z_dir=(-0.7071067812, 0, -0.7071067812))):
        with BuildLine():
            ThreePointArc((0, -2), (2, 0), (0, 2))
            Line((0, 2), (0, -2))
        make_face()
    revolve(axis=Axis((-56.4073281825, 65.6883277684, 8), (0, -1, 0)), mode=Mode.SUBTRACT)


with BuildPart() as f1_14:
    add(f1_13.part)

    # F9_s1_t21: cut F9_s1_tool22
    add(f9_s1_tool22.part, mode=Mode.SUBTRACT)


with BuildPart() as f9_s1_tool28:
    # F9_s1_s29 → F9_s1_t30 (new body)
    with BuildSketch(Plane.XY.offset(8)):
        with Locations((-57.4073281825, 82.6883277684)):
            Rectangle(F9_S1_S29_W, F9_S1_S29_H)
    extrude(amount=F9_S1_T30_DEPTH)

    # F9_s1_s31 → F9_s1_t32 (revolve, cut)
    with BuildSketch(Plane(origin=(-56.4073281825, 81.6883277684, 8), x_dir=(0.7071067812, -0.7071067812, 0), z_dir=(-0.7071067812, -0.7071067812, 0))):
        with BuildLine():
            ThreePointArc((0, -2), (2, 0), (0, 2))
            Line((0, 2), (0, -2))
        make_face()
    revolve(axis=Axis((-56.4073281825, 81.6883277684, 8), (0, 0, 1)), mode=Mode.SUBTRACT)


with BuildPart() as f1_15:
    add(f1_14.part)

    # F9_s1_t27: cut F9_s1_tool28
    add(f9_s1_tool28.part, mode=Mode.SUBTRACT)


with BuildPart() as f11:
    # F10 (on Top) → F11 (new body)
    with BuildSketch(Plane.XY):
        with Locations((-44.0662039816, -58.3389573097)):
            Rectangle(F10_W, F10_H)
    extrude(amount=F11_DEPTH)

    # F12 (on face) → F13 (join)
    with BuildSketch(Plane.XY.offset(4)):
        with Locations((-44.0662039816, -36.8389573097)):
            Rectangle(F12_W, F12_H)
        with Locations((-44.0662039816, -79.8389573097)):
            Rectangle(F12_W, F12_H)
    extrude(amount=F13_DEPTH)

    # F15 (on face) → F16 (join)
    with BuildSketch(Plane.YZ.offset(-34.0662039816)):
        Polygon((-77.8389573097, 0), (-77.8389573097, 4), (-77.8389573097, 14), (-81.8389573097, 14), (-81.8389573097, 0), align=None)
        Polygon((-38.8389573097, 14), (-38.8389573097, 4), (-38.8389573097, 0), (-34.8389573097, 0), (-34.8389573097, 14), align=None)
    extrude(amount=F16_DEPTH)

    # F14 (on face) → F17 (join)
    with BuildSketch(Plane(origin=(-54.0662039816, 0, 0), x_dir=(0, -1, 0), z_dir=(-1, 0, 0))):
        Polygon((38.8389573097, 0), (38.8389573097, 4), (38.8389573097, 14), (34.8389573097, 14), (34.8389573097, 0), align=None)
        Polygon((77.8389573097, 14), (77.8389573097, 4), (77.8389573097, 0), (81.8389573097, 0), (81.8389573097, 14), align=None)
    extrude(amount=F17_DEPTH)

    # F19 (on face) → F20 (join)
    with BuildSketch(Plane.XZ.offset(81.8389573097)):
        with Locations((-56.0662039816, 7)):
            Rectangle(F19_W, F19_H)
        with Locations((-32.0662039816, 7)):
            Rectangle(F19_W, F19_H)
    extrude(amount=F20_DEPTH)

    # F18 (on face) → F21 (join)
    with BuildSketch(Plane(origin=(0, -34.8389573097, 0), x_dir=(-1, 0, 0), z_dir=(0, 1, 0))):
        with Locations((32.0662039816, 7)):
            Rectangle(F18_W, F18_H)
        with Locations((56.0662039816, 7)):
            Rectangle(F18_W, F18_H)
    extrude(amount=F21_DEPTH)

    # F22 (on face) → F23 (join)
    with BuildSketch(Plane(origin=(-54.0662039816, 0, 0), x_dir=(0, -1, 0), z_dir=(-1, 0, 0))):
        with Locations((58.3389573097, 8)):
            Rectangle(F22_W, F22_H)
    extrude(amount=-F23_DEPTH)

    # F24 (on face) → F25 (join)
    with BuildSketch(Plane.YZ.offset(-34.0662039816)):
        with Locations((-58.3389573097, 8)):
            Rectangle(F24_W, F24_H)
    extrude(amount=-F25_DEPTH)

    # F26 (on face) + F27 (on face) → F28 (cut, through all)
    with BuildSketch(Plane.YZ.offset(-30.0662039816)):
        with Locations((-91.8389573097, 7)):
            Circle(F26_R)
    with BuildSketch(Plane.YZ.offset(-30.0662039816)):
        with Locations((-24.8389573097, 7)):
            Circle(F27_R)
    extrude(amount=-F28_DEPTH, mode=Mode.SUBTRACT)

    # F29 (size 2 in the source; OpenCascade refuses exactly that, so slightly less here)
    f29_edges = [f11.edges().sort_by_distance(p)[0] for p in [
        (-32.066204, -101.838957, 0),
        (-30.066204, -77.838957, 7),
        (-44.066204, -77.838957, 4),
        (-44.066204, -77.838957, 14),
        (-58.066204, -77.838957, 7),
        (-44.066204, -38.838957, 4),
        (-51.066204, -38.838957, 8),
        (-37.066204, -38.838957, 8),
        (-34.066204, -38.838957, 6),
        (-35.566204, -38.838957, 12),
        (-52.566204, -38.838957, 12),
        (-54.066204, -38.838957, 6),
        (-30.066204, -38.838957, 7),
        (-58.066204, -38.838957, 7),
        (-32.066204, -14.838957, 14),
        (-56.066204, -14.838957, 14),
        (-56.066204, -14.838957, 0),
        (-32.066204, -14.838957, 0),
        (-56.066204, -101.838957, 14),
        (-32.066204, -101.838957, 14),
        (-56.066204, -101.838957, 0),
    ]]
    chamfer(f29_edges, length=F29_SIZE)


solid = f11.part
